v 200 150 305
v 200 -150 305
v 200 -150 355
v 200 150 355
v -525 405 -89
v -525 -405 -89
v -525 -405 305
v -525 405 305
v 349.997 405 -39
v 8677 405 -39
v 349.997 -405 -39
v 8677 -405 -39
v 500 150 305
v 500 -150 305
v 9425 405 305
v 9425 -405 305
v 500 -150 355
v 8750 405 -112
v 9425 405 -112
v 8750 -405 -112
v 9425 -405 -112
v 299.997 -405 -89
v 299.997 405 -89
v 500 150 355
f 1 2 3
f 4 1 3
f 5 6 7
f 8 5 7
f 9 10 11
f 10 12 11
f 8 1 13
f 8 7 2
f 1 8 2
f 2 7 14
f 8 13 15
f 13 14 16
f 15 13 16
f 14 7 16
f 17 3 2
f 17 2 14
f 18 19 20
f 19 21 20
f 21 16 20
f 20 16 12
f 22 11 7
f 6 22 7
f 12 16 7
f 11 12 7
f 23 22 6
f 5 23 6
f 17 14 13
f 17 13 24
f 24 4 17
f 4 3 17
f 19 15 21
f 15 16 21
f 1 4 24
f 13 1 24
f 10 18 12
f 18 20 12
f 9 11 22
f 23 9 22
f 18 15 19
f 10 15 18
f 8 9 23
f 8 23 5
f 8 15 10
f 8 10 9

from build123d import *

# Parameters (mm, degrees)
SKETCH027_W      = 300
SKETCH027_H      = 50
EXTRUDE025_DEPTH = 150
EXTRUDE012_DEPTH = 405


with BuildPart() as extrude025:
    # Sketch027 → Extrude025 (new body, symmetric)
    with BuildSketch(Plane.XZ):
        with Locations((350, 330)):
            Rectangle(SKETCH027_W, SKETCH027_H)
    extrude(amount=EXTRUDE025_DEPTH, both=True)


with BuildPart() as fusion014:
    # Sketch020 → Extrude012 (new body, symmetric)
    with BuildSketch(Plane.XZ):
        Polygon((-525, -89), (-525, 305), (9425, 305), (9425, -112), (8750, -112), (8677, -39), (349.996538, -39), (299.996538, -89), align=None)
    extrude(amount=EXTRUDE012_DEPTH, both=True)

    # Fusion014: union Extrude025
    add(extrude025.part)


solid = fusion014.part
